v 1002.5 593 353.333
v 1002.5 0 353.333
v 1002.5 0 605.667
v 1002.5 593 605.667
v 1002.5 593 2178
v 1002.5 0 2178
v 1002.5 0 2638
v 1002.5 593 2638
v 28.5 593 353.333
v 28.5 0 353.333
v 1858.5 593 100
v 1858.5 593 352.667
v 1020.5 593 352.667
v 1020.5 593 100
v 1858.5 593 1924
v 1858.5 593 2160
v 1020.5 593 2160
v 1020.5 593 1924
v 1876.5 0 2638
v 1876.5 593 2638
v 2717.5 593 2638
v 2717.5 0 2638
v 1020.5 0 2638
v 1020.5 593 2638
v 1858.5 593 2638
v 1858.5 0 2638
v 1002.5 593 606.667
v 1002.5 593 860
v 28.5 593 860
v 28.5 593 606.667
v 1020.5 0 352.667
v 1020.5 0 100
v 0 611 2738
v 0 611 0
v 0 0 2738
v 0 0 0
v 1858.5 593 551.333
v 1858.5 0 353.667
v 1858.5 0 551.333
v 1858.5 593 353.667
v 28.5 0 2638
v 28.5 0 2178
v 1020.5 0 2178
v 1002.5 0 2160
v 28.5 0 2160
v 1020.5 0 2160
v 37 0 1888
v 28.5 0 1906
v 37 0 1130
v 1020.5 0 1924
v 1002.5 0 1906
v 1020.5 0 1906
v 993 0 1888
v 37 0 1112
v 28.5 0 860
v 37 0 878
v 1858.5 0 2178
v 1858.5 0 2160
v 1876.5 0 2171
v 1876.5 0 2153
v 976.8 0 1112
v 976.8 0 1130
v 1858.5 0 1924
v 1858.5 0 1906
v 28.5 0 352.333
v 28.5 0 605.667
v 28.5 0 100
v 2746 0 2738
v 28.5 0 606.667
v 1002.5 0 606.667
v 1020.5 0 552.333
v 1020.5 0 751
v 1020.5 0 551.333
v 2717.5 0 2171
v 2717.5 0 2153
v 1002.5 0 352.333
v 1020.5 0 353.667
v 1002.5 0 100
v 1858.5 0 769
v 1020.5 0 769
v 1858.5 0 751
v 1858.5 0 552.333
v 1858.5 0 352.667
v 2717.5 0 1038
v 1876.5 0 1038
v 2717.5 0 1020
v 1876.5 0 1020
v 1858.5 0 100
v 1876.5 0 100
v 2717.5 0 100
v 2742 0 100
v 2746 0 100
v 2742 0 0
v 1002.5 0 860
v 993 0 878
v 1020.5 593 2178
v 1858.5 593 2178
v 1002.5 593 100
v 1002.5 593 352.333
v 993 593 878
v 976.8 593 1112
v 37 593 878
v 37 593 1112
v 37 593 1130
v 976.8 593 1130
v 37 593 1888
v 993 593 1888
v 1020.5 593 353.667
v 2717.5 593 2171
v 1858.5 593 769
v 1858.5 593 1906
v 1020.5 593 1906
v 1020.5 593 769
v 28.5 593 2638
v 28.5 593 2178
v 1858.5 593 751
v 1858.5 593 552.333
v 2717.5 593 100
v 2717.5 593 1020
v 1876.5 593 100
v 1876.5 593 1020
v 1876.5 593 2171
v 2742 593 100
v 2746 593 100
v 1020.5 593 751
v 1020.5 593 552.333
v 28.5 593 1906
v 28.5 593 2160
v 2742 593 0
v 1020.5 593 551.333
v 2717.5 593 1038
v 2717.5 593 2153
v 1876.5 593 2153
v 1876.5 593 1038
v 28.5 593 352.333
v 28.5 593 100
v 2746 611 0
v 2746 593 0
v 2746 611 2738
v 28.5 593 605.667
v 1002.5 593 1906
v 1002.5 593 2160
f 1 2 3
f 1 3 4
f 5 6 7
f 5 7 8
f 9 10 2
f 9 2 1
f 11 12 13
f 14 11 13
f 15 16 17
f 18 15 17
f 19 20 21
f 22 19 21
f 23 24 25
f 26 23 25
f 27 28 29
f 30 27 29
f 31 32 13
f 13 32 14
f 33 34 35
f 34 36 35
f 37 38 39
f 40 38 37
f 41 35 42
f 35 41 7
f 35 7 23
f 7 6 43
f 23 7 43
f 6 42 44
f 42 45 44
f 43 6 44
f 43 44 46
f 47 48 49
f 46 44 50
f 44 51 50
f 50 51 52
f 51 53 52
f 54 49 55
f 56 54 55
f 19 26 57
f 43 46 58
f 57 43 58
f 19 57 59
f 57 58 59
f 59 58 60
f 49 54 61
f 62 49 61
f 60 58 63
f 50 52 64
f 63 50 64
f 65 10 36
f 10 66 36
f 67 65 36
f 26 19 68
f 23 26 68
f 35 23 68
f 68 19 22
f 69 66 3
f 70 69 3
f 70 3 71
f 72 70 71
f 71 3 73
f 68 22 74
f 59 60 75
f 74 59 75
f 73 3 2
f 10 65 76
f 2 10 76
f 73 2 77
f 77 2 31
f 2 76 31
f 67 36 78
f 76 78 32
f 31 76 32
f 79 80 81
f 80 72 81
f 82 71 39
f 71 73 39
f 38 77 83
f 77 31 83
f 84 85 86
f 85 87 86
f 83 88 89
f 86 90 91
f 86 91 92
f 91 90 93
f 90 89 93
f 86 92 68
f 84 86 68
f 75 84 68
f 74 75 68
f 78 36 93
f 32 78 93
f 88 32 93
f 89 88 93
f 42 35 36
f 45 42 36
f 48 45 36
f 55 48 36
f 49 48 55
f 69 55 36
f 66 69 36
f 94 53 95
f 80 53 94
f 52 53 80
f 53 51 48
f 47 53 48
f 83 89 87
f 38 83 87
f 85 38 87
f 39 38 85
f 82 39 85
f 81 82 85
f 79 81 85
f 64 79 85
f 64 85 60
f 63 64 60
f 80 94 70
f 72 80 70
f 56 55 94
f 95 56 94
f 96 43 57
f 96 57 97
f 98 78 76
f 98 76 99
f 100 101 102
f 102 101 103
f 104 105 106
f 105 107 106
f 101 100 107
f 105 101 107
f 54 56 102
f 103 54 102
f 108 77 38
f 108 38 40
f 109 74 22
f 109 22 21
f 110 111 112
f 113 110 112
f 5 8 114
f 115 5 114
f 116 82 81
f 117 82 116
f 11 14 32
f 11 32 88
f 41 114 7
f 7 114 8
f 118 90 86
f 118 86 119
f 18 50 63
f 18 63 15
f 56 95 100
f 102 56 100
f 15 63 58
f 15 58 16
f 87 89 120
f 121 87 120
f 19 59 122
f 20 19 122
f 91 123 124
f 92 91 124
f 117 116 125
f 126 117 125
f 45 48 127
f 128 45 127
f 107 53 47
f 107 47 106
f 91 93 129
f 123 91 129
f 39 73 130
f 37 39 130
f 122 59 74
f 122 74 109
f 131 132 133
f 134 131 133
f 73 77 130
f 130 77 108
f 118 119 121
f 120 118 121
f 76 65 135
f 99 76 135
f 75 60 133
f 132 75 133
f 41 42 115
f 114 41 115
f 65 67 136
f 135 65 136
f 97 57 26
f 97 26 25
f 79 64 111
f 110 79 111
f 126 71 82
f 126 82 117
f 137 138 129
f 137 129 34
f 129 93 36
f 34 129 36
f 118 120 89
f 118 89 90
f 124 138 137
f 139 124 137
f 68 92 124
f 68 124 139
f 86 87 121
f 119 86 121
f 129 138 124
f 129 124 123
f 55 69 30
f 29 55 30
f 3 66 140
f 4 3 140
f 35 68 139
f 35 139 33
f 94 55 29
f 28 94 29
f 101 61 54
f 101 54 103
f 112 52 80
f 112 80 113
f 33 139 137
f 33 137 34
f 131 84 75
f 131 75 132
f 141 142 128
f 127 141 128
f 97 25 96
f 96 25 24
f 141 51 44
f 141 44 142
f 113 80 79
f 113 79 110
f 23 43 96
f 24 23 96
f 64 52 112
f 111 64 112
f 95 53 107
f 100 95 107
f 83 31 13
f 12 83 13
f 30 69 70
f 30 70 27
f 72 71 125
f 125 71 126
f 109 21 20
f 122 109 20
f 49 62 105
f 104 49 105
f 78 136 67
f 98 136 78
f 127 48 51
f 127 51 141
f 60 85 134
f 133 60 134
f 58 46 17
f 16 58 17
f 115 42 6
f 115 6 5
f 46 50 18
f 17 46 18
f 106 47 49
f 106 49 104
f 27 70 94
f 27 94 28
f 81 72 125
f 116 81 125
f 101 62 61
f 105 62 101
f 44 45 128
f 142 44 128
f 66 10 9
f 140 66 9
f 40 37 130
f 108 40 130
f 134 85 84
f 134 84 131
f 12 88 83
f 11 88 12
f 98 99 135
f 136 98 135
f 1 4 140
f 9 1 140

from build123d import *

# Parameters (mm, degrees)
SKETCH_W      = 2742
SKETCH_H      = 593
PAD_DEPTH     = 100
SKETCH001_W   = 28.5
SKETCH001_H   = 593
SKETCH001_W_2 = 18
PAD001_DEPTH  = 2538
SKETCH002_W   = 2746
SKETCH002_H   = 593
PAD002_DEPTH  = 100
SKETCH003_W   = 2746
SKETCH003_H   = 2738
PAD003_DEPTH  = 18
SKETCH004_W   = 593
SKETCH004_H   = 18
PAD004_DEPTH  = 841
SKETCH005_W   = 593
SKETCH005_H   = 18
SKETCH005_H_2 = 1
PAD005_DEPTH  = 838
SKETCH006_W   = 593
SKETCH006_H   = 18
SKETCH006_H_2 = 1
PAD006_DEPTH  = 974
SKETCH007_W   = 8.5
SKETCH007_H   = 593
SKETCH007_W_2 = 9.5
PAD007_DEPTH  = 1024
SKETCH008_W   = 593
SKETCH008_H   = 18
PAD008_DEPTH  = 939.8


with BuildPart() as part:
    # Sketch → Pad (new body)
    with BuildSketch(Plane.XY):
        with Locations((1371, 296.5)):
            Rectangle(SKETCH_W, SKETCH_H)
    extrude(amount=PAD_DEPTH)

    # Sketch001 (on Face6 of Pad) → Pad001 (join)
    with BuildSketch(Plane.XY.offset(100)):
        with Locations((14.25, 296.5)):
            Rectangle(SKETCH001_W, SKETCH001_H)
        with Locations((1011.5, 296.5)):
            Rectangle(SKETCH001_W_2, SKETCH001_H)
        with Locations((1867.5, 296.5)):
            Rectangle(SKETCH001_W_2, SKETCH001_H)
        with Locations((2731.75, 296.5)):
            Rectangle(SKETCH001_W, SKETCH001_H)
    extrude(amount=PAD001_DEPTH)

    # Sketch002 (on Face16 of Pad001) → Pad002 (join)
    with BuildSketch(Plane.XY.offset(2638)):
        with Locations((1373, 296.5)):
            Rectangle(SKETCH002_W, SKETCH002_H)
    extrude(amount=PAD002_DEPTH)

    # Sketch003 (on Face12 of Pad002) → Pad003 (join)
    with BuildSketch(Plane(origin=(0, 593, 0), x_dir=(-1, 0, 0), z_dir=(0, 1, 0))):
        with Locations((-1373, 1369)):
            Rectangle(SKETCH003_W, SKETCH003_H)
    extrude(amount=PAD003_DEPTH)

    # Sketch004 (on Face24 of Pad003) → Pad004 (join)
    with BuildSketch(Plane.YZ.offset(1876.5)):
        with Locations((296.5, 1029)):
            Rectangle(SKETCH004_W, SKETCH004_H)
        with Locations((296.5, 2162)):
            Rectangle(SKETCH004_W, SKETCH004_H)
    extrude(amount=PAD004_DEPTH)

    # Sketch005 (on Face21 of Pad004) → Pad005 (join)
    with BuildSketch(Plane.YZ.offset(1020.5)):
        with Locations((296.5, 2169)):
            Rectangle(SKETCH005_W, SKETCH005_H)
        with Locations((296.5, 1915)):
            Rectangle(SKETCH005_W, SKETCH005_H)
        with Locations((296.5, 760)):
            Rectangle(SKETCH005_W, SKETCH005_H)
        with Locations((296.5, 551.833333)):
            Rectangle(SKETCH005_W, SKETCH005_H_2)
        with Locations((296.5, 353.166667)):
            Rectangle(SKETCH005_W, SKETCH005_H_2)
    extrude(amount=PAD005_DEPTH)

    # Sketch006 (on Face17 of Pad005) → Pad006 (join)
    with BuildSketch(Plane.YZ.offset(28.5)):
        with Locations((296.5, 2169)):
            Rectangle(SKETCH006_W, SKETCH006_H)
        with Locations((296.5, 1897)):
            Rectangle(SKETCH006_W, SKETCH006_H)
        with Locations((296.5, 869)):
            Rectangle(SKETCH006_W, SKETCH006_H)
        with Locations((296.5, 606.166667)):
            Rectangle(SKETCH006_W, SKETCH006_H_2)
        with Locations((296.5, 352.833333)):
            Rectangle(SKETCH006_W, SKETCH006_H_2)
    extrude(amount=PAD006_DEPTH)

    # Sketch007 (on Face75 of Pad006) → Pad007 (join)
    with BuildSketch(Plane.XY.offset(878)):
        with Locations((32.75, 296.5)):
            Rectangle(SKETCH007_W, SKETCH007_H)
        with Locations((997.75, 296.5)):
            Rectangle(SKETCH007_W_2, SKETCH007_H)
    extrude(amount=PAD007_DEPTH)

    # Sketch008 (on Face78 of Pad007) → Pad008 (join)
    with BuildSketch(Plane.YZ.offset(37)):
        with Locations((296.5, 1121)):
            Rectangle(SKETCH008_W, SKETCH008_H)
    extrude(amount=PAD008_DEPTH)


solid = part.part
